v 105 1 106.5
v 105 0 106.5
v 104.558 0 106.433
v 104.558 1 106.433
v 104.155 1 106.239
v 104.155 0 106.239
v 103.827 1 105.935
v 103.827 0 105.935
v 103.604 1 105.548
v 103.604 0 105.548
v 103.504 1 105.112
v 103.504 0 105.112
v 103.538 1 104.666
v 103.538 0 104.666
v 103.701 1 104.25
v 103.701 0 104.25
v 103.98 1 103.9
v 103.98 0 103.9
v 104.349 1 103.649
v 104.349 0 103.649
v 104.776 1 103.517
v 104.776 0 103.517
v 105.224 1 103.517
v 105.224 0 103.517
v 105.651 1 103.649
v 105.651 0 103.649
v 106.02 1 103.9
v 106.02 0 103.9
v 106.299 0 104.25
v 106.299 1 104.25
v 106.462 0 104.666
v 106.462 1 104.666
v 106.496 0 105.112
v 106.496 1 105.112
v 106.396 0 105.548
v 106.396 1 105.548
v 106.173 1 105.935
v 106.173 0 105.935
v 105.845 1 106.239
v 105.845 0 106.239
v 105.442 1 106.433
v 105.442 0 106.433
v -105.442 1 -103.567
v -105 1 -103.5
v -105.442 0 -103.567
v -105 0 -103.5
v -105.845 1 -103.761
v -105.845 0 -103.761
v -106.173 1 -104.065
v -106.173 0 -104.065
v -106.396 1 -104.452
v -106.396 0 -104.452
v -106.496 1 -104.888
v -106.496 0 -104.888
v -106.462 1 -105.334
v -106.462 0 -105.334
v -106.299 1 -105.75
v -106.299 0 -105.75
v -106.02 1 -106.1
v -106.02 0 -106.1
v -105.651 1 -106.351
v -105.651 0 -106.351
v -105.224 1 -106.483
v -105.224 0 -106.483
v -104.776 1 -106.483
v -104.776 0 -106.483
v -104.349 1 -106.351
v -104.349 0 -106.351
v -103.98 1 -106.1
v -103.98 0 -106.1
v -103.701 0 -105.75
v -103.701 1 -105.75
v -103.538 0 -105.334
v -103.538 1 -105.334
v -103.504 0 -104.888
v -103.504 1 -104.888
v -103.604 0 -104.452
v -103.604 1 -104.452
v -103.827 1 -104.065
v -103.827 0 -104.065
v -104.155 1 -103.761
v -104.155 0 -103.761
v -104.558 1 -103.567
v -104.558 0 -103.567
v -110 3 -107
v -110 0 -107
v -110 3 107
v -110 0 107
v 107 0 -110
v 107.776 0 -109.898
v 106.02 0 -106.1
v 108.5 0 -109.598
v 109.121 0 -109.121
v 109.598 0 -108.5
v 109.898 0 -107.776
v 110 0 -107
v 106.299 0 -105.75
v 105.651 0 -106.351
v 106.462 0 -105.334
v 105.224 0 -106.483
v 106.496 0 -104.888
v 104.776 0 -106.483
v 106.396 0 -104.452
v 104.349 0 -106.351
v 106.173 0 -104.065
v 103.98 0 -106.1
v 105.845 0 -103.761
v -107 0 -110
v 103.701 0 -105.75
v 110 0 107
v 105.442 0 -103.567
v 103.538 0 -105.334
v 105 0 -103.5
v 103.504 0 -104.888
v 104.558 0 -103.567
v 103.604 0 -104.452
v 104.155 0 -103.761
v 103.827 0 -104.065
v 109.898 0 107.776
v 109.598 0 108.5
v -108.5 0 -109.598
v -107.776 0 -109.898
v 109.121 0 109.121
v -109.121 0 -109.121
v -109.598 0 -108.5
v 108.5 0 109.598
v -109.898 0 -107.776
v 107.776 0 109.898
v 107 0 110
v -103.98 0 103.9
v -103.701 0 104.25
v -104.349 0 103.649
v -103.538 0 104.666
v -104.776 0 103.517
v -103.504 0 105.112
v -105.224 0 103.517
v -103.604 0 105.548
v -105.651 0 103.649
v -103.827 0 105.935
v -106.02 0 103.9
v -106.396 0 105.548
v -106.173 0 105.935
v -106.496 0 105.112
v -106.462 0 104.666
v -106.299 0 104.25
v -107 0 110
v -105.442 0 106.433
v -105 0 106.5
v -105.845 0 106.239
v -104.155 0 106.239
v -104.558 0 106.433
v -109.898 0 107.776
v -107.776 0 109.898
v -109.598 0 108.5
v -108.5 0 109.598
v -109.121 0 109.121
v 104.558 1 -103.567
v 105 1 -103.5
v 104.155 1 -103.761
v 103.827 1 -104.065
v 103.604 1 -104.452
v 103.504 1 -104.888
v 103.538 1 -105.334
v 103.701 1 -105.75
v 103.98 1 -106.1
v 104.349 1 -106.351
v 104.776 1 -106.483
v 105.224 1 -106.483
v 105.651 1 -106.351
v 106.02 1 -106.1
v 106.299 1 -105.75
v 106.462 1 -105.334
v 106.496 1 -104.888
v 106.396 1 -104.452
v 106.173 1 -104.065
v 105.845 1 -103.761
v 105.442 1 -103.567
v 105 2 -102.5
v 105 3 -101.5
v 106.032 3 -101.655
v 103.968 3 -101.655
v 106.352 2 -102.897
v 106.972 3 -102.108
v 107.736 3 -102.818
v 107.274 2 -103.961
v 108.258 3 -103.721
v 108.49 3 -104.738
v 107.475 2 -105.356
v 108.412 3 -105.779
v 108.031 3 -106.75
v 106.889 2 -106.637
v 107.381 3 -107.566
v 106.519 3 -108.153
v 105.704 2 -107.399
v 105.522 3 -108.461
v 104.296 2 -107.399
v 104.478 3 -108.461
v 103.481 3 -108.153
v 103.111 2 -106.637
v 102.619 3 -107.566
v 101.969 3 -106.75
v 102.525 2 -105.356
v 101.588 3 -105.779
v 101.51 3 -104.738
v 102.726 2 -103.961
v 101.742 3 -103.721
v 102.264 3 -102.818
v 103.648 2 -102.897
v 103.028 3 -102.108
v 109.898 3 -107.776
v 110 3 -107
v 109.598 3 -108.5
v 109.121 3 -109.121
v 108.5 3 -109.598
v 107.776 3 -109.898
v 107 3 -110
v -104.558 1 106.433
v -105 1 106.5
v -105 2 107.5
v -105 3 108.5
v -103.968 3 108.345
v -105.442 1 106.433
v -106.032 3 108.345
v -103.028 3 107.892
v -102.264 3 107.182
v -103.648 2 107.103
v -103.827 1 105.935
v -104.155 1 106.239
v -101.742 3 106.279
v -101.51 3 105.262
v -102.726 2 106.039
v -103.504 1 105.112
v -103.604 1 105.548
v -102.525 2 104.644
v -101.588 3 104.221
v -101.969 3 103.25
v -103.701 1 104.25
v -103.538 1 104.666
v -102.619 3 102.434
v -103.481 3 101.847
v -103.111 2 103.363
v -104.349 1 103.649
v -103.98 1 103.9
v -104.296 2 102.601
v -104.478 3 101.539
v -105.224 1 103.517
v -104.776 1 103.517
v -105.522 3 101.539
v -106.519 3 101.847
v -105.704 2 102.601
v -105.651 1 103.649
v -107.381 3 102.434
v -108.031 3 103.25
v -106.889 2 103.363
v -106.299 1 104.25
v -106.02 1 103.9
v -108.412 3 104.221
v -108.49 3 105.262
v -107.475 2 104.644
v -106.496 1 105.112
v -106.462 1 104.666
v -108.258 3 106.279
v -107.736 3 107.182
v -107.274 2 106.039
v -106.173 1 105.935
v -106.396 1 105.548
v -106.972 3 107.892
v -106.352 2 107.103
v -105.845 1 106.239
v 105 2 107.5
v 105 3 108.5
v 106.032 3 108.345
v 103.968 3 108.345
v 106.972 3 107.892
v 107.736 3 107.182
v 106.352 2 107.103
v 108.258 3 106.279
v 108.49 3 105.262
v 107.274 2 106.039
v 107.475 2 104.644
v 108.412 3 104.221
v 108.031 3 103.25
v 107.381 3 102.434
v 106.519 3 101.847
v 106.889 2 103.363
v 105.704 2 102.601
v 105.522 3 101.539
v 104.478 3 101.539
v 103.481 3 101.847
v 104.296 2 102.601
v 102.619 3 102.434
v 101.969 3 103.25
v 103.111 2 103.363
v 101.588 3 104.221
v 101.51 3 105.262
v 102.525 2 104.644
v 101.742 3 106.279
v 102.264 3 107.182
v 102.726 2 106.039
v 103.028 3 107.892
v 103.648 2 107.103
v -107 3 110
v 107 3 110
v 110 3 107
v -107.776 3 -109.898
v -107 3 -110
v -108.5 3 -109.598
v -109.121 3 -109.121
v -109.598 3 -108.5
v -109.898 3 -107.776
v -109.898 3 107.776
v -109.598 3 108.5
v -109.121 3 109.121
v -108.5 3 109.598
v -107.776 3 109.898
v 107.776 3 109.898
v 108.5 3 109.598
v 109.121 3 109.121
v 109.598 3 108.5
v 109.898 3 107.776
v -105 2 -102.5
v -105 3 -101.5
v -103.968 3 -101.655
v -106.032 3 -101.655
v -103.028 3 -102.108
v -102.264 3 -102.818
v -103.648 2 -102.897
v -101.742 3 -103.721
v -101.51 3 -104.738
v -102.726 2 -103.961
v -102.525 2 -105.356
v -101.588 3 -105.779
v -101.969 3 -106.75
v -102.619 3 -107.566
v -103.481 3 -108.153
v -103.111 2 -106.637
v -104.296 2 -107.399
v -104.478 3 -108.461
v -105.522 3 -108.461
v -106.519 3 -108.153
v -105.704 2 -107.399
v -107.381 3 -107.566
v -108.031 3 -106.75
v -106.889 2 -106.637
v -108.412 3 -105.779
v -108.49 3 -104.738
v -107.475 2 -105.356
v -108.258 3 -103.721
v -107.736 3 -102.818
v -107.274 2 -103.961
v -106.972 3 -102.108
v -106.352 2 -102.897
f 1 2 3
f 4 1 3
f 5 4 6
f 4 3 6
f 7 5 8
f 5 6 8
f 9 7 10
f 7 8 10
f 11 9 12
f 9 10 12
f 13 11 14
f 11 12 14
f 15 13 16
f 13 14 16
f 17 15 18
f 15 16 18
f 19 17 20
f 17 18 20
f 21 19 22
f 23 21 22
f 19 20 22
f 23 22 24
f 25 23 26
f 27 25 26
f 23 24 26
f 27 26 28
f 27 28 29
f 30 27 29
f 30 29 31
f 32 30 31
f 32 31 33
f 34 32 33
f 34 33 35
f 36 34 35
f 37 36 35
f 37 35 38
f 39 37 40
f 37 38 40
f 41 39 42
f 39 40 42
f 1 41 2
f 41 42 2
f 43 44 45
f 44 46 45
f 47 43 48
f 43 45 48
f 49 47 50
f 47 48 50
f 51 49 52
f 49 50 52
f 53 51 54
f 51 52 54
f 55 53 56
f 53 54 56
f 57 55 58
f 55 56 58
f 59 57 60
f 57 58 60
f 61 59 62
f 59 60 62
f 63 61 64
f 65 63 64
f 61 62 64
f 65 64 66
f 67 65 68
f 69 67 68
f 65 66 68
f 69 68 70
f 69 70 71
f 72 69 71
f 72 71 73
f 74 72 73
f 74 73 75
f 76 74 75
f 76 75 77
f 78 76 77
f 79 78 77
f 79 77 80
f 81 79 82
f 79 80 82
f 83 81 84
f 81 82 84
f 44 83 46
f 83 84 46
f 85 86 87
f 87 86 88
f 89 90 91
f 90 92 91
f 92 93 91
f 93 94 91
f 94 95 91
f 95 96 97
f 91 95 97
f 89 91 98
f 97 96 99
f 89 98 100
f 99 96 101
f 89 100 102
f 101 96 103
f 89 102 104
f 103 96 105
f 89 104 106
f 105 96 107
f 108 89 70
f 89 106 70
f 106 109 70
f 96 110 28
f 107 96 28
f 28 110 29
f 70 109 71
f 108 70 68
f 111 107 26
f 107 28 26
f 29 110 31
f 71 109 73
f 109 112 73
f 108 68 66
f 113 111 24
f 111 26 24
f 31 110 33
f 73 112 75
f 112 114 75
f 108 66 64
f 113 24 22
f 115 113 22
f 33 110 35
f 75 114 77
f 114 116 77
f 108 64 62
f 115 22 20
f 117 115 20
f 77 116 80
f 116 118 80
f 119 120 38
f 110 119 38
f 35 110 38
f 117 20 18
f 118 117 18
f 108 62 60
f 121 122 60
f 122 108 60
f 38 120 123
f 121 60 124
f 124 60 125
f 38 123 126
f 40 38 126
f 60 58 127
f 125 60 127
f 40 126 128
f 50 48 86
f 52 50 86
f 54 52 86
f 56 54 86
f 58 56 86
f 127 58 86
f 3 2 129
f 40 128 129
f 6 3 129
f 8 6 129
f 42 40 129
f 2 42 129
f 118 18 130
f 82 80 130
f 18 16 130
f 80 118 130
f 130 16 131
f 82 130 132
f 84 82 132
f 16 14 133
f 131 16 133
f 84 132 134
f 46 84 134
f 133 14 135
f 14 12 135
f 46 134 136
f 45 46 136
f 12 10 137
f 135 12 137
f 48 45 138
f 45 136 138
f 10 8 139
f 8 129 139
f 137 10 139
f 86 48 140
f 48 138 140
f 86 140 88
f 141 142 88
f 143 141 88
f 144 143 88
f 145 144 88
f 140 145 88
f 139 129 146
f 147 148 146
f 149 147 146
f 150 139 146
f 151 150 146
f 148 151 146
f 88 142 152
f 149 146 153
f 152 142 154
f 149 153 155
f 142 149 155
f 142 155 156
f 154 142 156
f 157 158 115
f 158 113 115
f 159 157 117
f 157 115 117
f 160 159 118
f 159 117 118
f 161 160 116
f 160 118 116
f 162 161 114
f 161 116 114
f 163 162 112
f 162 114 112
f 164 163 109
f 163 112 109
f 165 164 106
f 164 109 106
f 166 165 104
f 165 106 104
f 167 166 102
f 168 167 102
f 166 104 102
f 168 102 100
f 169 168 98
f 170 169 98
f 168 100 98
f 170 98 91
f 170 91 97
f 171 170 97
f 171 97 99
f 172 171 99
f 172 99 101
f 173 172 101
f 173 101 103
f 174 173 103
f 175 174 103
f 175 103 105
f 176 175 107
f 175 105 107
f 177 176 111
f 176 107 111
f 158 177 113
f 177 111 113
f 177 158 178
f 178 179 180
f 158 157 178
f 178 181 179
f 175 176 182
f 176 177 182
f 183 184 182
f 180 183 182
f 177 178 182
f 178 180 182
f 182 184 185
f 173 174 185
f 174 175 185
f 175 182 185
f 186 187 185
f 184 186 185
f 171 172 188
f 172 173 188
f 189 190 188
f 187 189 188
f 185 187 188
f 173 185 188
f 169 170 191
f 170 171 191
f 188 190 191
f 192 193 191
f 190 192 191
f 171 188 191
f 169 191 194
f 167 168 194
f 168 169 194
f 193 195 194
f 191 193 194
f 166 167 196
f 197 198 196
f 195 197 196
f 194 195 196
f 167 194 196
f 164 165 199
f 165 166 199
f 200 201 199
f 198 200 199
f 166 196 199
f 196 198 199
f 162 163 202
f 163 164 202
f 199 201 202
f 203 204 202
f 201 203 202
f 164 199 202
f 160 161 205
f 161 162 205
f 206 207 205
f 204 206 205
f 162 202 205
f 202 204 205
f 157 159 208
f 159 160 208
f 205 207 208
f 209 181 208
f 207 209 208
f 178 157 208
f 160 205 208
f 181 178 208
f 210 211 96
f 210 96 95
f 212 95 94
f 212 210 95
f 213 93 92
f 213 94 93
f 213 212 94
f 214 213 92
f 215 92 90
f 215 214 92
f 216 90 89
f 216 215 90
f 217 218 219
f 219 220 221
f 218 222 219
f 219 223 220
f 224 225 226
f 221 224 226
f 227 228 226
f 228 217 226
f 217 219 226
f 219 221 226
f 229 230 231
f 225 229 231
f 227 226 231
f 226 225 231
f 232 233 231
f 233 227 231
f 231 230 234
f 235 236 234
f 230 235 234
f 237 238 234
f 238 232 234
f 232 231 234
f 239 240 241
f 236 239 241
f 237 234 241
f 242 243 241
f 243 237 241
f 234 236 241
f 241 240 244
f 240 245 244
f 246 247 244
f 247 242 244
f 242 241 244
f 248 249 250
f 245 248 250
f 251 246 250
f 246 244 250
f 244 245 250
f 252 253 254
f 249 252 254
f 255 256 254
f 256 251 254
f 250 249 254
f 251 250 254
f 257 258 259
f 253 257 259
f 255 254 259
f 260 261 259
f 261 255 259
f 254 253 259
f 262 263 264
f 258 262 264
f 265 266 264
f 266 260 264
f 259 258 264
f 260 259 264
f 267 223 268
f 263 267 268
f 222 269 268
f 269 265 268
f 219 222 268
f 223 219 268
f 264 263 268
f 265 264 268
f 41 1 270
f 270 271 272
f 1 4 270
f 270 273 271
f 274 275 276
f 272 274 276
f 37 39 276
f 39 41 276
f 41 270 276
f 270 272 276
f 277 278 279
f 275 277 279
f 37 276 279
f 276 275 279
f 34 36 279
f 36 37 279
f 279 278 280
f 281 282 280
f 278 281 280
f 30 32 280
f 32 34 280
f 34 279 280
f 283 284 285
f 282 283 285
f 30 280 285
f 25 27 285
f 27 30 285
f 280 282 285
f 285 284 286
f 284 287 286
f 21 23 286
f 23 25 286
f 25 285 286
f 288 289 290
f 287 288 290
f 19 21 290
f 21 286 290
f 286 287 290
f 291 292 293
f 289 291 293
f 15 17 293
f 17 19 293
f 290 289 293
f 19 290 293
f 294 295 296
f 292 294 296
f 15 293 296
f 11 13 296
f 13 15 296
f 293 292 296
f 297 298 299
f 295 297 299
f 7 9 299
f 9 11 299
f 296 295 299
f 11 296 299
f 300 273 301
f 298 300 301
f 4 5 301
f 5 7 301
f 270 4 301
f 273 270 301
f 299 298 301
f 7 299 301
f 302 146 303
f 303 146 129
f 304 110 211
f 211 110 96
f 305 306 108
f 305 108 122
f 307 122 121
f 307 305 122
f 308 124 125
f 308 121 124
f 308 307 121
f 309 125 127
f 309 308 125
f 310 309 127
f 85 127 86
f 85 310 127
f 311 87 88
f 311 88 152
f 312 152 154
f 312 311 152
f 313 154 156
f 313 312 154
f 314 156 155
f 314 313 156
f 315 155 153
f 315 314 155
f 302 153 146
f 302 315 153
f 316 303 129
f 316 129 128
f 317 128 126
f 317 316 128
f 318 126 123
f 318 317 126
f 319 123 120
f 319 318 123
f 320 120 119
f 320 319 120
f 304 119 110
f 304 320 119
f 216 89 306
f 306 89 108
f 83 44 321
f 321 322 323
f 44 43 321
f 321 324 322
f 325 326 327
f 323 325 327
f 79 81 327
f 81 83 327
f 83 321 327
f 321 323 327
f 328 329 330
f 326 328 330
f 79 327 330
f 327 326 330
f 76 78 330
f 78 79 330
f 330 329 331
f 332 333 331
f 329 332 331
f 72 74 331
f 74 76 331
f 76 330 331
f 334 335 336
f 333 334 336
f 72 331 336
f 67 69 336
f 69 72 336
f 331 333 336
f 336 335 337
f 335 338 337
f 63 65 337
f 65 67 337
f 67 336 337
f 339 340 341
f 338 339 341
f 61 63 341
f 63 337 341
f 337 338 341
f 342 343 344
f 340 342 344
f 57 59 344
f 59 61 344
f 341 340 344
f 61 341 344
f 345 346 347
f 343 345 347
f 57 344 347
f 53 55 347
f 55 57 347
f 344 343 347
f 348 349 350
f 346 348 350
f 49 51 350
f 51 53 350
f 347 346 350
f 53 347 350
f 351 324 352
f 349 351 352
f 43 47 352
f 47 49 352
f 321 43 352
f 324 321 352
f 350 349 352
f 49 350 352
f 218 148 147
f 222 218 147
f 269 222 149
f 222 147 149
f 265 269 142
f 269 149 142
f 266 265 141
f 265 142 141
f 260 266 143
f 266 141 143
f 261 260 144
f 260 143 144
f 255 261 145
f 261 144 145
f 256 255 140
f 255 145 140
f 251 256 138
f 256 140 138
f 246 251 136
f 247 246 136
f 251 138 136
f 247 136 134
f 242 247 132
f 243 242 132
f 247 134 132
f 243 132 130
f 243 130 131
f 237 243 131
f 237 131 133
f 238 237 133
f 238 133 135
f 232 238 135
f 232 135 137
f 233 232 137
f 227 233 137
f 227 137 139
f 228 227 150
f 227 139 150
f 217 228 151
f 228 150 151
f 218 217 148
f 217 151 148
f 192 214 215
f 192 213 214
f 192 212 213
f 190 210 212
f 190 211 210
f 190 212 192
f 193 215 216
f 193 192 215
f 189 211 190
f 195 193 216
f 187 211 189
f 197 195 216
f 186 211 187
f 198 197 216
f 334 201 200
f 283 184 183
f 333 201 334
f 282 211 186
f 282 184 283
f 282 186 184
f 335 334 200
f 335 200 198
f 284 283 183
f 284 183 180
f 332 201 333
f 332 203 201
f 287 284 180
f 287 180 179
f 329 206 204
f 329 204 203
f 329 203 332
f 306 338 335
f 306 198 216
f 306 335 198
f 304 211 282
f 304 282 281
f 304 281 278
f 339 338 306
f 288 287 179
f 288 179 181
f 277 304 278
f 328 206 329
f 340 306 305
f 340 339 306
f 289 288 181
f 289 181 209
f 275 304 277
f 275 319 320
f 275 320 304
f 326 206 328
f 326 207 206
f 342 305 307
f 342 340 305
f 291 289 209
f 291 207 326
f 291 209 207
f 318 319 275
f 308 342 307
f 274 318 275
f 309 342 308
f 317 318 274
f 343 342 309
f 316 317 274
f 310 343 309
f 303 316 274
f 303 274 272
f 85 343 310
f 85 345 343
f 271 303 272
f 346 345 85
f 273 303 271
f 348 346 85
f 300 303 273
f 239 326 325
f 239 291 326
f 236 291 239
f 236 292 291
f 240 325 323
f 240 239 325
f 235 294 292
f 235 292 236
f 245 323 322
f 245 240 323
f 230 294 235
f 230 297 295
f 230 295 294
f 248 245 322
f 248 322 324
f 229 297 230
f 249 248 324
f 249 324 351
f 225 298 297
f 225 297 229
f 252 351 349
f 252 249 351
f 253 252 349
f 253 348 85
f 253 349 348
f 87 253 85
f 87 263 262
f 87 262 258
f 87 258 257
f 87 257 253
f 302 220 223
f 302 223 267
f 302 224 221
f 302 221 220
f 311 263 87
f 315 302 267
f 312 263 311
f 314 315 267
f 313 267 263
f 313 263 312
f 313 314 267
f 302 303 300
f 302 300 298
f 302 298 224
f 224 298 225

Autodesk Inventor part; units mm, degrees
ref_plane "YZ Plane" through (0, 0, 0) normal (1, 0, 0) x (0, 1, 0)
ref_plane "XZ Plane" through (0, 0, 0) normal (0, 1, 0) x (-1, 0, 0)
ref_plane "XY Plane" through (0, 0, 0) normal (0, 0, 1) x (1, 0, 0)
sketch "Szkic1" plane through (0, 0, 0) normal (0, 1, 0) x (-1, 0, 0)
  line L0 (110, 110) -> (-110, 110)
  line L1 (-110, 110) -> (-110, -110)
  line L2 (-110, -110) -> (110, -110)
  line L3 (110, -110) -> (110, 110)
  line L4 (110, 0) -> (-110, 0) construction
  line L5 (0, 110) -> (0, -110) construction
  point P0 (0, 0)
  dimension "d0" = 220
  dimension "d1" = 220
extrude "Wyciągnięcie proste1" add sketch "Szkic1" along normal blind 3
sketch "Szkic2" plane through (0, 3, 0) normal (0, 1, 0) x (1, 0, 0)
  line L0 (-110, 110) -> (-110, -110) projected
  line L1 (-110, -110) -> (110, -110) projected
  line L2 (110, -110) -> (110, 110) projected
  line L3 (110, 110) -> (-110, 110) projected
  point P0 (0, 0)
  point P1 (-105, -105)
  point P2 (-105, 105)
  point P3 (105, 105)
  point P4 (105, -105)
  dimension "d4" = 5
  dimension "d5" = 5
  dimension "d6" = 5
  dimension "d7" = 5
hole "Otwór1" at (-105, 3, 105) at (-105, 3, -105) at (105, 3, -105) at (105, 3, 105) direction (0, -1, 0) diameter 3 end through all
fillet "Zaokrąglenie1" radius 3 4 edges at (-110, 1.5, 110) (110, 1.5, 110) (110, 1.5, -110) (-110, 1.5, -110)
chamfer "Faza1" distance 2 angle 45 4 edges at (105, 3, -106.5) (-105, 3, -106.5) (105, 3, 103.5) (-105, 3, 103.5)
properties part number "20_stół"
